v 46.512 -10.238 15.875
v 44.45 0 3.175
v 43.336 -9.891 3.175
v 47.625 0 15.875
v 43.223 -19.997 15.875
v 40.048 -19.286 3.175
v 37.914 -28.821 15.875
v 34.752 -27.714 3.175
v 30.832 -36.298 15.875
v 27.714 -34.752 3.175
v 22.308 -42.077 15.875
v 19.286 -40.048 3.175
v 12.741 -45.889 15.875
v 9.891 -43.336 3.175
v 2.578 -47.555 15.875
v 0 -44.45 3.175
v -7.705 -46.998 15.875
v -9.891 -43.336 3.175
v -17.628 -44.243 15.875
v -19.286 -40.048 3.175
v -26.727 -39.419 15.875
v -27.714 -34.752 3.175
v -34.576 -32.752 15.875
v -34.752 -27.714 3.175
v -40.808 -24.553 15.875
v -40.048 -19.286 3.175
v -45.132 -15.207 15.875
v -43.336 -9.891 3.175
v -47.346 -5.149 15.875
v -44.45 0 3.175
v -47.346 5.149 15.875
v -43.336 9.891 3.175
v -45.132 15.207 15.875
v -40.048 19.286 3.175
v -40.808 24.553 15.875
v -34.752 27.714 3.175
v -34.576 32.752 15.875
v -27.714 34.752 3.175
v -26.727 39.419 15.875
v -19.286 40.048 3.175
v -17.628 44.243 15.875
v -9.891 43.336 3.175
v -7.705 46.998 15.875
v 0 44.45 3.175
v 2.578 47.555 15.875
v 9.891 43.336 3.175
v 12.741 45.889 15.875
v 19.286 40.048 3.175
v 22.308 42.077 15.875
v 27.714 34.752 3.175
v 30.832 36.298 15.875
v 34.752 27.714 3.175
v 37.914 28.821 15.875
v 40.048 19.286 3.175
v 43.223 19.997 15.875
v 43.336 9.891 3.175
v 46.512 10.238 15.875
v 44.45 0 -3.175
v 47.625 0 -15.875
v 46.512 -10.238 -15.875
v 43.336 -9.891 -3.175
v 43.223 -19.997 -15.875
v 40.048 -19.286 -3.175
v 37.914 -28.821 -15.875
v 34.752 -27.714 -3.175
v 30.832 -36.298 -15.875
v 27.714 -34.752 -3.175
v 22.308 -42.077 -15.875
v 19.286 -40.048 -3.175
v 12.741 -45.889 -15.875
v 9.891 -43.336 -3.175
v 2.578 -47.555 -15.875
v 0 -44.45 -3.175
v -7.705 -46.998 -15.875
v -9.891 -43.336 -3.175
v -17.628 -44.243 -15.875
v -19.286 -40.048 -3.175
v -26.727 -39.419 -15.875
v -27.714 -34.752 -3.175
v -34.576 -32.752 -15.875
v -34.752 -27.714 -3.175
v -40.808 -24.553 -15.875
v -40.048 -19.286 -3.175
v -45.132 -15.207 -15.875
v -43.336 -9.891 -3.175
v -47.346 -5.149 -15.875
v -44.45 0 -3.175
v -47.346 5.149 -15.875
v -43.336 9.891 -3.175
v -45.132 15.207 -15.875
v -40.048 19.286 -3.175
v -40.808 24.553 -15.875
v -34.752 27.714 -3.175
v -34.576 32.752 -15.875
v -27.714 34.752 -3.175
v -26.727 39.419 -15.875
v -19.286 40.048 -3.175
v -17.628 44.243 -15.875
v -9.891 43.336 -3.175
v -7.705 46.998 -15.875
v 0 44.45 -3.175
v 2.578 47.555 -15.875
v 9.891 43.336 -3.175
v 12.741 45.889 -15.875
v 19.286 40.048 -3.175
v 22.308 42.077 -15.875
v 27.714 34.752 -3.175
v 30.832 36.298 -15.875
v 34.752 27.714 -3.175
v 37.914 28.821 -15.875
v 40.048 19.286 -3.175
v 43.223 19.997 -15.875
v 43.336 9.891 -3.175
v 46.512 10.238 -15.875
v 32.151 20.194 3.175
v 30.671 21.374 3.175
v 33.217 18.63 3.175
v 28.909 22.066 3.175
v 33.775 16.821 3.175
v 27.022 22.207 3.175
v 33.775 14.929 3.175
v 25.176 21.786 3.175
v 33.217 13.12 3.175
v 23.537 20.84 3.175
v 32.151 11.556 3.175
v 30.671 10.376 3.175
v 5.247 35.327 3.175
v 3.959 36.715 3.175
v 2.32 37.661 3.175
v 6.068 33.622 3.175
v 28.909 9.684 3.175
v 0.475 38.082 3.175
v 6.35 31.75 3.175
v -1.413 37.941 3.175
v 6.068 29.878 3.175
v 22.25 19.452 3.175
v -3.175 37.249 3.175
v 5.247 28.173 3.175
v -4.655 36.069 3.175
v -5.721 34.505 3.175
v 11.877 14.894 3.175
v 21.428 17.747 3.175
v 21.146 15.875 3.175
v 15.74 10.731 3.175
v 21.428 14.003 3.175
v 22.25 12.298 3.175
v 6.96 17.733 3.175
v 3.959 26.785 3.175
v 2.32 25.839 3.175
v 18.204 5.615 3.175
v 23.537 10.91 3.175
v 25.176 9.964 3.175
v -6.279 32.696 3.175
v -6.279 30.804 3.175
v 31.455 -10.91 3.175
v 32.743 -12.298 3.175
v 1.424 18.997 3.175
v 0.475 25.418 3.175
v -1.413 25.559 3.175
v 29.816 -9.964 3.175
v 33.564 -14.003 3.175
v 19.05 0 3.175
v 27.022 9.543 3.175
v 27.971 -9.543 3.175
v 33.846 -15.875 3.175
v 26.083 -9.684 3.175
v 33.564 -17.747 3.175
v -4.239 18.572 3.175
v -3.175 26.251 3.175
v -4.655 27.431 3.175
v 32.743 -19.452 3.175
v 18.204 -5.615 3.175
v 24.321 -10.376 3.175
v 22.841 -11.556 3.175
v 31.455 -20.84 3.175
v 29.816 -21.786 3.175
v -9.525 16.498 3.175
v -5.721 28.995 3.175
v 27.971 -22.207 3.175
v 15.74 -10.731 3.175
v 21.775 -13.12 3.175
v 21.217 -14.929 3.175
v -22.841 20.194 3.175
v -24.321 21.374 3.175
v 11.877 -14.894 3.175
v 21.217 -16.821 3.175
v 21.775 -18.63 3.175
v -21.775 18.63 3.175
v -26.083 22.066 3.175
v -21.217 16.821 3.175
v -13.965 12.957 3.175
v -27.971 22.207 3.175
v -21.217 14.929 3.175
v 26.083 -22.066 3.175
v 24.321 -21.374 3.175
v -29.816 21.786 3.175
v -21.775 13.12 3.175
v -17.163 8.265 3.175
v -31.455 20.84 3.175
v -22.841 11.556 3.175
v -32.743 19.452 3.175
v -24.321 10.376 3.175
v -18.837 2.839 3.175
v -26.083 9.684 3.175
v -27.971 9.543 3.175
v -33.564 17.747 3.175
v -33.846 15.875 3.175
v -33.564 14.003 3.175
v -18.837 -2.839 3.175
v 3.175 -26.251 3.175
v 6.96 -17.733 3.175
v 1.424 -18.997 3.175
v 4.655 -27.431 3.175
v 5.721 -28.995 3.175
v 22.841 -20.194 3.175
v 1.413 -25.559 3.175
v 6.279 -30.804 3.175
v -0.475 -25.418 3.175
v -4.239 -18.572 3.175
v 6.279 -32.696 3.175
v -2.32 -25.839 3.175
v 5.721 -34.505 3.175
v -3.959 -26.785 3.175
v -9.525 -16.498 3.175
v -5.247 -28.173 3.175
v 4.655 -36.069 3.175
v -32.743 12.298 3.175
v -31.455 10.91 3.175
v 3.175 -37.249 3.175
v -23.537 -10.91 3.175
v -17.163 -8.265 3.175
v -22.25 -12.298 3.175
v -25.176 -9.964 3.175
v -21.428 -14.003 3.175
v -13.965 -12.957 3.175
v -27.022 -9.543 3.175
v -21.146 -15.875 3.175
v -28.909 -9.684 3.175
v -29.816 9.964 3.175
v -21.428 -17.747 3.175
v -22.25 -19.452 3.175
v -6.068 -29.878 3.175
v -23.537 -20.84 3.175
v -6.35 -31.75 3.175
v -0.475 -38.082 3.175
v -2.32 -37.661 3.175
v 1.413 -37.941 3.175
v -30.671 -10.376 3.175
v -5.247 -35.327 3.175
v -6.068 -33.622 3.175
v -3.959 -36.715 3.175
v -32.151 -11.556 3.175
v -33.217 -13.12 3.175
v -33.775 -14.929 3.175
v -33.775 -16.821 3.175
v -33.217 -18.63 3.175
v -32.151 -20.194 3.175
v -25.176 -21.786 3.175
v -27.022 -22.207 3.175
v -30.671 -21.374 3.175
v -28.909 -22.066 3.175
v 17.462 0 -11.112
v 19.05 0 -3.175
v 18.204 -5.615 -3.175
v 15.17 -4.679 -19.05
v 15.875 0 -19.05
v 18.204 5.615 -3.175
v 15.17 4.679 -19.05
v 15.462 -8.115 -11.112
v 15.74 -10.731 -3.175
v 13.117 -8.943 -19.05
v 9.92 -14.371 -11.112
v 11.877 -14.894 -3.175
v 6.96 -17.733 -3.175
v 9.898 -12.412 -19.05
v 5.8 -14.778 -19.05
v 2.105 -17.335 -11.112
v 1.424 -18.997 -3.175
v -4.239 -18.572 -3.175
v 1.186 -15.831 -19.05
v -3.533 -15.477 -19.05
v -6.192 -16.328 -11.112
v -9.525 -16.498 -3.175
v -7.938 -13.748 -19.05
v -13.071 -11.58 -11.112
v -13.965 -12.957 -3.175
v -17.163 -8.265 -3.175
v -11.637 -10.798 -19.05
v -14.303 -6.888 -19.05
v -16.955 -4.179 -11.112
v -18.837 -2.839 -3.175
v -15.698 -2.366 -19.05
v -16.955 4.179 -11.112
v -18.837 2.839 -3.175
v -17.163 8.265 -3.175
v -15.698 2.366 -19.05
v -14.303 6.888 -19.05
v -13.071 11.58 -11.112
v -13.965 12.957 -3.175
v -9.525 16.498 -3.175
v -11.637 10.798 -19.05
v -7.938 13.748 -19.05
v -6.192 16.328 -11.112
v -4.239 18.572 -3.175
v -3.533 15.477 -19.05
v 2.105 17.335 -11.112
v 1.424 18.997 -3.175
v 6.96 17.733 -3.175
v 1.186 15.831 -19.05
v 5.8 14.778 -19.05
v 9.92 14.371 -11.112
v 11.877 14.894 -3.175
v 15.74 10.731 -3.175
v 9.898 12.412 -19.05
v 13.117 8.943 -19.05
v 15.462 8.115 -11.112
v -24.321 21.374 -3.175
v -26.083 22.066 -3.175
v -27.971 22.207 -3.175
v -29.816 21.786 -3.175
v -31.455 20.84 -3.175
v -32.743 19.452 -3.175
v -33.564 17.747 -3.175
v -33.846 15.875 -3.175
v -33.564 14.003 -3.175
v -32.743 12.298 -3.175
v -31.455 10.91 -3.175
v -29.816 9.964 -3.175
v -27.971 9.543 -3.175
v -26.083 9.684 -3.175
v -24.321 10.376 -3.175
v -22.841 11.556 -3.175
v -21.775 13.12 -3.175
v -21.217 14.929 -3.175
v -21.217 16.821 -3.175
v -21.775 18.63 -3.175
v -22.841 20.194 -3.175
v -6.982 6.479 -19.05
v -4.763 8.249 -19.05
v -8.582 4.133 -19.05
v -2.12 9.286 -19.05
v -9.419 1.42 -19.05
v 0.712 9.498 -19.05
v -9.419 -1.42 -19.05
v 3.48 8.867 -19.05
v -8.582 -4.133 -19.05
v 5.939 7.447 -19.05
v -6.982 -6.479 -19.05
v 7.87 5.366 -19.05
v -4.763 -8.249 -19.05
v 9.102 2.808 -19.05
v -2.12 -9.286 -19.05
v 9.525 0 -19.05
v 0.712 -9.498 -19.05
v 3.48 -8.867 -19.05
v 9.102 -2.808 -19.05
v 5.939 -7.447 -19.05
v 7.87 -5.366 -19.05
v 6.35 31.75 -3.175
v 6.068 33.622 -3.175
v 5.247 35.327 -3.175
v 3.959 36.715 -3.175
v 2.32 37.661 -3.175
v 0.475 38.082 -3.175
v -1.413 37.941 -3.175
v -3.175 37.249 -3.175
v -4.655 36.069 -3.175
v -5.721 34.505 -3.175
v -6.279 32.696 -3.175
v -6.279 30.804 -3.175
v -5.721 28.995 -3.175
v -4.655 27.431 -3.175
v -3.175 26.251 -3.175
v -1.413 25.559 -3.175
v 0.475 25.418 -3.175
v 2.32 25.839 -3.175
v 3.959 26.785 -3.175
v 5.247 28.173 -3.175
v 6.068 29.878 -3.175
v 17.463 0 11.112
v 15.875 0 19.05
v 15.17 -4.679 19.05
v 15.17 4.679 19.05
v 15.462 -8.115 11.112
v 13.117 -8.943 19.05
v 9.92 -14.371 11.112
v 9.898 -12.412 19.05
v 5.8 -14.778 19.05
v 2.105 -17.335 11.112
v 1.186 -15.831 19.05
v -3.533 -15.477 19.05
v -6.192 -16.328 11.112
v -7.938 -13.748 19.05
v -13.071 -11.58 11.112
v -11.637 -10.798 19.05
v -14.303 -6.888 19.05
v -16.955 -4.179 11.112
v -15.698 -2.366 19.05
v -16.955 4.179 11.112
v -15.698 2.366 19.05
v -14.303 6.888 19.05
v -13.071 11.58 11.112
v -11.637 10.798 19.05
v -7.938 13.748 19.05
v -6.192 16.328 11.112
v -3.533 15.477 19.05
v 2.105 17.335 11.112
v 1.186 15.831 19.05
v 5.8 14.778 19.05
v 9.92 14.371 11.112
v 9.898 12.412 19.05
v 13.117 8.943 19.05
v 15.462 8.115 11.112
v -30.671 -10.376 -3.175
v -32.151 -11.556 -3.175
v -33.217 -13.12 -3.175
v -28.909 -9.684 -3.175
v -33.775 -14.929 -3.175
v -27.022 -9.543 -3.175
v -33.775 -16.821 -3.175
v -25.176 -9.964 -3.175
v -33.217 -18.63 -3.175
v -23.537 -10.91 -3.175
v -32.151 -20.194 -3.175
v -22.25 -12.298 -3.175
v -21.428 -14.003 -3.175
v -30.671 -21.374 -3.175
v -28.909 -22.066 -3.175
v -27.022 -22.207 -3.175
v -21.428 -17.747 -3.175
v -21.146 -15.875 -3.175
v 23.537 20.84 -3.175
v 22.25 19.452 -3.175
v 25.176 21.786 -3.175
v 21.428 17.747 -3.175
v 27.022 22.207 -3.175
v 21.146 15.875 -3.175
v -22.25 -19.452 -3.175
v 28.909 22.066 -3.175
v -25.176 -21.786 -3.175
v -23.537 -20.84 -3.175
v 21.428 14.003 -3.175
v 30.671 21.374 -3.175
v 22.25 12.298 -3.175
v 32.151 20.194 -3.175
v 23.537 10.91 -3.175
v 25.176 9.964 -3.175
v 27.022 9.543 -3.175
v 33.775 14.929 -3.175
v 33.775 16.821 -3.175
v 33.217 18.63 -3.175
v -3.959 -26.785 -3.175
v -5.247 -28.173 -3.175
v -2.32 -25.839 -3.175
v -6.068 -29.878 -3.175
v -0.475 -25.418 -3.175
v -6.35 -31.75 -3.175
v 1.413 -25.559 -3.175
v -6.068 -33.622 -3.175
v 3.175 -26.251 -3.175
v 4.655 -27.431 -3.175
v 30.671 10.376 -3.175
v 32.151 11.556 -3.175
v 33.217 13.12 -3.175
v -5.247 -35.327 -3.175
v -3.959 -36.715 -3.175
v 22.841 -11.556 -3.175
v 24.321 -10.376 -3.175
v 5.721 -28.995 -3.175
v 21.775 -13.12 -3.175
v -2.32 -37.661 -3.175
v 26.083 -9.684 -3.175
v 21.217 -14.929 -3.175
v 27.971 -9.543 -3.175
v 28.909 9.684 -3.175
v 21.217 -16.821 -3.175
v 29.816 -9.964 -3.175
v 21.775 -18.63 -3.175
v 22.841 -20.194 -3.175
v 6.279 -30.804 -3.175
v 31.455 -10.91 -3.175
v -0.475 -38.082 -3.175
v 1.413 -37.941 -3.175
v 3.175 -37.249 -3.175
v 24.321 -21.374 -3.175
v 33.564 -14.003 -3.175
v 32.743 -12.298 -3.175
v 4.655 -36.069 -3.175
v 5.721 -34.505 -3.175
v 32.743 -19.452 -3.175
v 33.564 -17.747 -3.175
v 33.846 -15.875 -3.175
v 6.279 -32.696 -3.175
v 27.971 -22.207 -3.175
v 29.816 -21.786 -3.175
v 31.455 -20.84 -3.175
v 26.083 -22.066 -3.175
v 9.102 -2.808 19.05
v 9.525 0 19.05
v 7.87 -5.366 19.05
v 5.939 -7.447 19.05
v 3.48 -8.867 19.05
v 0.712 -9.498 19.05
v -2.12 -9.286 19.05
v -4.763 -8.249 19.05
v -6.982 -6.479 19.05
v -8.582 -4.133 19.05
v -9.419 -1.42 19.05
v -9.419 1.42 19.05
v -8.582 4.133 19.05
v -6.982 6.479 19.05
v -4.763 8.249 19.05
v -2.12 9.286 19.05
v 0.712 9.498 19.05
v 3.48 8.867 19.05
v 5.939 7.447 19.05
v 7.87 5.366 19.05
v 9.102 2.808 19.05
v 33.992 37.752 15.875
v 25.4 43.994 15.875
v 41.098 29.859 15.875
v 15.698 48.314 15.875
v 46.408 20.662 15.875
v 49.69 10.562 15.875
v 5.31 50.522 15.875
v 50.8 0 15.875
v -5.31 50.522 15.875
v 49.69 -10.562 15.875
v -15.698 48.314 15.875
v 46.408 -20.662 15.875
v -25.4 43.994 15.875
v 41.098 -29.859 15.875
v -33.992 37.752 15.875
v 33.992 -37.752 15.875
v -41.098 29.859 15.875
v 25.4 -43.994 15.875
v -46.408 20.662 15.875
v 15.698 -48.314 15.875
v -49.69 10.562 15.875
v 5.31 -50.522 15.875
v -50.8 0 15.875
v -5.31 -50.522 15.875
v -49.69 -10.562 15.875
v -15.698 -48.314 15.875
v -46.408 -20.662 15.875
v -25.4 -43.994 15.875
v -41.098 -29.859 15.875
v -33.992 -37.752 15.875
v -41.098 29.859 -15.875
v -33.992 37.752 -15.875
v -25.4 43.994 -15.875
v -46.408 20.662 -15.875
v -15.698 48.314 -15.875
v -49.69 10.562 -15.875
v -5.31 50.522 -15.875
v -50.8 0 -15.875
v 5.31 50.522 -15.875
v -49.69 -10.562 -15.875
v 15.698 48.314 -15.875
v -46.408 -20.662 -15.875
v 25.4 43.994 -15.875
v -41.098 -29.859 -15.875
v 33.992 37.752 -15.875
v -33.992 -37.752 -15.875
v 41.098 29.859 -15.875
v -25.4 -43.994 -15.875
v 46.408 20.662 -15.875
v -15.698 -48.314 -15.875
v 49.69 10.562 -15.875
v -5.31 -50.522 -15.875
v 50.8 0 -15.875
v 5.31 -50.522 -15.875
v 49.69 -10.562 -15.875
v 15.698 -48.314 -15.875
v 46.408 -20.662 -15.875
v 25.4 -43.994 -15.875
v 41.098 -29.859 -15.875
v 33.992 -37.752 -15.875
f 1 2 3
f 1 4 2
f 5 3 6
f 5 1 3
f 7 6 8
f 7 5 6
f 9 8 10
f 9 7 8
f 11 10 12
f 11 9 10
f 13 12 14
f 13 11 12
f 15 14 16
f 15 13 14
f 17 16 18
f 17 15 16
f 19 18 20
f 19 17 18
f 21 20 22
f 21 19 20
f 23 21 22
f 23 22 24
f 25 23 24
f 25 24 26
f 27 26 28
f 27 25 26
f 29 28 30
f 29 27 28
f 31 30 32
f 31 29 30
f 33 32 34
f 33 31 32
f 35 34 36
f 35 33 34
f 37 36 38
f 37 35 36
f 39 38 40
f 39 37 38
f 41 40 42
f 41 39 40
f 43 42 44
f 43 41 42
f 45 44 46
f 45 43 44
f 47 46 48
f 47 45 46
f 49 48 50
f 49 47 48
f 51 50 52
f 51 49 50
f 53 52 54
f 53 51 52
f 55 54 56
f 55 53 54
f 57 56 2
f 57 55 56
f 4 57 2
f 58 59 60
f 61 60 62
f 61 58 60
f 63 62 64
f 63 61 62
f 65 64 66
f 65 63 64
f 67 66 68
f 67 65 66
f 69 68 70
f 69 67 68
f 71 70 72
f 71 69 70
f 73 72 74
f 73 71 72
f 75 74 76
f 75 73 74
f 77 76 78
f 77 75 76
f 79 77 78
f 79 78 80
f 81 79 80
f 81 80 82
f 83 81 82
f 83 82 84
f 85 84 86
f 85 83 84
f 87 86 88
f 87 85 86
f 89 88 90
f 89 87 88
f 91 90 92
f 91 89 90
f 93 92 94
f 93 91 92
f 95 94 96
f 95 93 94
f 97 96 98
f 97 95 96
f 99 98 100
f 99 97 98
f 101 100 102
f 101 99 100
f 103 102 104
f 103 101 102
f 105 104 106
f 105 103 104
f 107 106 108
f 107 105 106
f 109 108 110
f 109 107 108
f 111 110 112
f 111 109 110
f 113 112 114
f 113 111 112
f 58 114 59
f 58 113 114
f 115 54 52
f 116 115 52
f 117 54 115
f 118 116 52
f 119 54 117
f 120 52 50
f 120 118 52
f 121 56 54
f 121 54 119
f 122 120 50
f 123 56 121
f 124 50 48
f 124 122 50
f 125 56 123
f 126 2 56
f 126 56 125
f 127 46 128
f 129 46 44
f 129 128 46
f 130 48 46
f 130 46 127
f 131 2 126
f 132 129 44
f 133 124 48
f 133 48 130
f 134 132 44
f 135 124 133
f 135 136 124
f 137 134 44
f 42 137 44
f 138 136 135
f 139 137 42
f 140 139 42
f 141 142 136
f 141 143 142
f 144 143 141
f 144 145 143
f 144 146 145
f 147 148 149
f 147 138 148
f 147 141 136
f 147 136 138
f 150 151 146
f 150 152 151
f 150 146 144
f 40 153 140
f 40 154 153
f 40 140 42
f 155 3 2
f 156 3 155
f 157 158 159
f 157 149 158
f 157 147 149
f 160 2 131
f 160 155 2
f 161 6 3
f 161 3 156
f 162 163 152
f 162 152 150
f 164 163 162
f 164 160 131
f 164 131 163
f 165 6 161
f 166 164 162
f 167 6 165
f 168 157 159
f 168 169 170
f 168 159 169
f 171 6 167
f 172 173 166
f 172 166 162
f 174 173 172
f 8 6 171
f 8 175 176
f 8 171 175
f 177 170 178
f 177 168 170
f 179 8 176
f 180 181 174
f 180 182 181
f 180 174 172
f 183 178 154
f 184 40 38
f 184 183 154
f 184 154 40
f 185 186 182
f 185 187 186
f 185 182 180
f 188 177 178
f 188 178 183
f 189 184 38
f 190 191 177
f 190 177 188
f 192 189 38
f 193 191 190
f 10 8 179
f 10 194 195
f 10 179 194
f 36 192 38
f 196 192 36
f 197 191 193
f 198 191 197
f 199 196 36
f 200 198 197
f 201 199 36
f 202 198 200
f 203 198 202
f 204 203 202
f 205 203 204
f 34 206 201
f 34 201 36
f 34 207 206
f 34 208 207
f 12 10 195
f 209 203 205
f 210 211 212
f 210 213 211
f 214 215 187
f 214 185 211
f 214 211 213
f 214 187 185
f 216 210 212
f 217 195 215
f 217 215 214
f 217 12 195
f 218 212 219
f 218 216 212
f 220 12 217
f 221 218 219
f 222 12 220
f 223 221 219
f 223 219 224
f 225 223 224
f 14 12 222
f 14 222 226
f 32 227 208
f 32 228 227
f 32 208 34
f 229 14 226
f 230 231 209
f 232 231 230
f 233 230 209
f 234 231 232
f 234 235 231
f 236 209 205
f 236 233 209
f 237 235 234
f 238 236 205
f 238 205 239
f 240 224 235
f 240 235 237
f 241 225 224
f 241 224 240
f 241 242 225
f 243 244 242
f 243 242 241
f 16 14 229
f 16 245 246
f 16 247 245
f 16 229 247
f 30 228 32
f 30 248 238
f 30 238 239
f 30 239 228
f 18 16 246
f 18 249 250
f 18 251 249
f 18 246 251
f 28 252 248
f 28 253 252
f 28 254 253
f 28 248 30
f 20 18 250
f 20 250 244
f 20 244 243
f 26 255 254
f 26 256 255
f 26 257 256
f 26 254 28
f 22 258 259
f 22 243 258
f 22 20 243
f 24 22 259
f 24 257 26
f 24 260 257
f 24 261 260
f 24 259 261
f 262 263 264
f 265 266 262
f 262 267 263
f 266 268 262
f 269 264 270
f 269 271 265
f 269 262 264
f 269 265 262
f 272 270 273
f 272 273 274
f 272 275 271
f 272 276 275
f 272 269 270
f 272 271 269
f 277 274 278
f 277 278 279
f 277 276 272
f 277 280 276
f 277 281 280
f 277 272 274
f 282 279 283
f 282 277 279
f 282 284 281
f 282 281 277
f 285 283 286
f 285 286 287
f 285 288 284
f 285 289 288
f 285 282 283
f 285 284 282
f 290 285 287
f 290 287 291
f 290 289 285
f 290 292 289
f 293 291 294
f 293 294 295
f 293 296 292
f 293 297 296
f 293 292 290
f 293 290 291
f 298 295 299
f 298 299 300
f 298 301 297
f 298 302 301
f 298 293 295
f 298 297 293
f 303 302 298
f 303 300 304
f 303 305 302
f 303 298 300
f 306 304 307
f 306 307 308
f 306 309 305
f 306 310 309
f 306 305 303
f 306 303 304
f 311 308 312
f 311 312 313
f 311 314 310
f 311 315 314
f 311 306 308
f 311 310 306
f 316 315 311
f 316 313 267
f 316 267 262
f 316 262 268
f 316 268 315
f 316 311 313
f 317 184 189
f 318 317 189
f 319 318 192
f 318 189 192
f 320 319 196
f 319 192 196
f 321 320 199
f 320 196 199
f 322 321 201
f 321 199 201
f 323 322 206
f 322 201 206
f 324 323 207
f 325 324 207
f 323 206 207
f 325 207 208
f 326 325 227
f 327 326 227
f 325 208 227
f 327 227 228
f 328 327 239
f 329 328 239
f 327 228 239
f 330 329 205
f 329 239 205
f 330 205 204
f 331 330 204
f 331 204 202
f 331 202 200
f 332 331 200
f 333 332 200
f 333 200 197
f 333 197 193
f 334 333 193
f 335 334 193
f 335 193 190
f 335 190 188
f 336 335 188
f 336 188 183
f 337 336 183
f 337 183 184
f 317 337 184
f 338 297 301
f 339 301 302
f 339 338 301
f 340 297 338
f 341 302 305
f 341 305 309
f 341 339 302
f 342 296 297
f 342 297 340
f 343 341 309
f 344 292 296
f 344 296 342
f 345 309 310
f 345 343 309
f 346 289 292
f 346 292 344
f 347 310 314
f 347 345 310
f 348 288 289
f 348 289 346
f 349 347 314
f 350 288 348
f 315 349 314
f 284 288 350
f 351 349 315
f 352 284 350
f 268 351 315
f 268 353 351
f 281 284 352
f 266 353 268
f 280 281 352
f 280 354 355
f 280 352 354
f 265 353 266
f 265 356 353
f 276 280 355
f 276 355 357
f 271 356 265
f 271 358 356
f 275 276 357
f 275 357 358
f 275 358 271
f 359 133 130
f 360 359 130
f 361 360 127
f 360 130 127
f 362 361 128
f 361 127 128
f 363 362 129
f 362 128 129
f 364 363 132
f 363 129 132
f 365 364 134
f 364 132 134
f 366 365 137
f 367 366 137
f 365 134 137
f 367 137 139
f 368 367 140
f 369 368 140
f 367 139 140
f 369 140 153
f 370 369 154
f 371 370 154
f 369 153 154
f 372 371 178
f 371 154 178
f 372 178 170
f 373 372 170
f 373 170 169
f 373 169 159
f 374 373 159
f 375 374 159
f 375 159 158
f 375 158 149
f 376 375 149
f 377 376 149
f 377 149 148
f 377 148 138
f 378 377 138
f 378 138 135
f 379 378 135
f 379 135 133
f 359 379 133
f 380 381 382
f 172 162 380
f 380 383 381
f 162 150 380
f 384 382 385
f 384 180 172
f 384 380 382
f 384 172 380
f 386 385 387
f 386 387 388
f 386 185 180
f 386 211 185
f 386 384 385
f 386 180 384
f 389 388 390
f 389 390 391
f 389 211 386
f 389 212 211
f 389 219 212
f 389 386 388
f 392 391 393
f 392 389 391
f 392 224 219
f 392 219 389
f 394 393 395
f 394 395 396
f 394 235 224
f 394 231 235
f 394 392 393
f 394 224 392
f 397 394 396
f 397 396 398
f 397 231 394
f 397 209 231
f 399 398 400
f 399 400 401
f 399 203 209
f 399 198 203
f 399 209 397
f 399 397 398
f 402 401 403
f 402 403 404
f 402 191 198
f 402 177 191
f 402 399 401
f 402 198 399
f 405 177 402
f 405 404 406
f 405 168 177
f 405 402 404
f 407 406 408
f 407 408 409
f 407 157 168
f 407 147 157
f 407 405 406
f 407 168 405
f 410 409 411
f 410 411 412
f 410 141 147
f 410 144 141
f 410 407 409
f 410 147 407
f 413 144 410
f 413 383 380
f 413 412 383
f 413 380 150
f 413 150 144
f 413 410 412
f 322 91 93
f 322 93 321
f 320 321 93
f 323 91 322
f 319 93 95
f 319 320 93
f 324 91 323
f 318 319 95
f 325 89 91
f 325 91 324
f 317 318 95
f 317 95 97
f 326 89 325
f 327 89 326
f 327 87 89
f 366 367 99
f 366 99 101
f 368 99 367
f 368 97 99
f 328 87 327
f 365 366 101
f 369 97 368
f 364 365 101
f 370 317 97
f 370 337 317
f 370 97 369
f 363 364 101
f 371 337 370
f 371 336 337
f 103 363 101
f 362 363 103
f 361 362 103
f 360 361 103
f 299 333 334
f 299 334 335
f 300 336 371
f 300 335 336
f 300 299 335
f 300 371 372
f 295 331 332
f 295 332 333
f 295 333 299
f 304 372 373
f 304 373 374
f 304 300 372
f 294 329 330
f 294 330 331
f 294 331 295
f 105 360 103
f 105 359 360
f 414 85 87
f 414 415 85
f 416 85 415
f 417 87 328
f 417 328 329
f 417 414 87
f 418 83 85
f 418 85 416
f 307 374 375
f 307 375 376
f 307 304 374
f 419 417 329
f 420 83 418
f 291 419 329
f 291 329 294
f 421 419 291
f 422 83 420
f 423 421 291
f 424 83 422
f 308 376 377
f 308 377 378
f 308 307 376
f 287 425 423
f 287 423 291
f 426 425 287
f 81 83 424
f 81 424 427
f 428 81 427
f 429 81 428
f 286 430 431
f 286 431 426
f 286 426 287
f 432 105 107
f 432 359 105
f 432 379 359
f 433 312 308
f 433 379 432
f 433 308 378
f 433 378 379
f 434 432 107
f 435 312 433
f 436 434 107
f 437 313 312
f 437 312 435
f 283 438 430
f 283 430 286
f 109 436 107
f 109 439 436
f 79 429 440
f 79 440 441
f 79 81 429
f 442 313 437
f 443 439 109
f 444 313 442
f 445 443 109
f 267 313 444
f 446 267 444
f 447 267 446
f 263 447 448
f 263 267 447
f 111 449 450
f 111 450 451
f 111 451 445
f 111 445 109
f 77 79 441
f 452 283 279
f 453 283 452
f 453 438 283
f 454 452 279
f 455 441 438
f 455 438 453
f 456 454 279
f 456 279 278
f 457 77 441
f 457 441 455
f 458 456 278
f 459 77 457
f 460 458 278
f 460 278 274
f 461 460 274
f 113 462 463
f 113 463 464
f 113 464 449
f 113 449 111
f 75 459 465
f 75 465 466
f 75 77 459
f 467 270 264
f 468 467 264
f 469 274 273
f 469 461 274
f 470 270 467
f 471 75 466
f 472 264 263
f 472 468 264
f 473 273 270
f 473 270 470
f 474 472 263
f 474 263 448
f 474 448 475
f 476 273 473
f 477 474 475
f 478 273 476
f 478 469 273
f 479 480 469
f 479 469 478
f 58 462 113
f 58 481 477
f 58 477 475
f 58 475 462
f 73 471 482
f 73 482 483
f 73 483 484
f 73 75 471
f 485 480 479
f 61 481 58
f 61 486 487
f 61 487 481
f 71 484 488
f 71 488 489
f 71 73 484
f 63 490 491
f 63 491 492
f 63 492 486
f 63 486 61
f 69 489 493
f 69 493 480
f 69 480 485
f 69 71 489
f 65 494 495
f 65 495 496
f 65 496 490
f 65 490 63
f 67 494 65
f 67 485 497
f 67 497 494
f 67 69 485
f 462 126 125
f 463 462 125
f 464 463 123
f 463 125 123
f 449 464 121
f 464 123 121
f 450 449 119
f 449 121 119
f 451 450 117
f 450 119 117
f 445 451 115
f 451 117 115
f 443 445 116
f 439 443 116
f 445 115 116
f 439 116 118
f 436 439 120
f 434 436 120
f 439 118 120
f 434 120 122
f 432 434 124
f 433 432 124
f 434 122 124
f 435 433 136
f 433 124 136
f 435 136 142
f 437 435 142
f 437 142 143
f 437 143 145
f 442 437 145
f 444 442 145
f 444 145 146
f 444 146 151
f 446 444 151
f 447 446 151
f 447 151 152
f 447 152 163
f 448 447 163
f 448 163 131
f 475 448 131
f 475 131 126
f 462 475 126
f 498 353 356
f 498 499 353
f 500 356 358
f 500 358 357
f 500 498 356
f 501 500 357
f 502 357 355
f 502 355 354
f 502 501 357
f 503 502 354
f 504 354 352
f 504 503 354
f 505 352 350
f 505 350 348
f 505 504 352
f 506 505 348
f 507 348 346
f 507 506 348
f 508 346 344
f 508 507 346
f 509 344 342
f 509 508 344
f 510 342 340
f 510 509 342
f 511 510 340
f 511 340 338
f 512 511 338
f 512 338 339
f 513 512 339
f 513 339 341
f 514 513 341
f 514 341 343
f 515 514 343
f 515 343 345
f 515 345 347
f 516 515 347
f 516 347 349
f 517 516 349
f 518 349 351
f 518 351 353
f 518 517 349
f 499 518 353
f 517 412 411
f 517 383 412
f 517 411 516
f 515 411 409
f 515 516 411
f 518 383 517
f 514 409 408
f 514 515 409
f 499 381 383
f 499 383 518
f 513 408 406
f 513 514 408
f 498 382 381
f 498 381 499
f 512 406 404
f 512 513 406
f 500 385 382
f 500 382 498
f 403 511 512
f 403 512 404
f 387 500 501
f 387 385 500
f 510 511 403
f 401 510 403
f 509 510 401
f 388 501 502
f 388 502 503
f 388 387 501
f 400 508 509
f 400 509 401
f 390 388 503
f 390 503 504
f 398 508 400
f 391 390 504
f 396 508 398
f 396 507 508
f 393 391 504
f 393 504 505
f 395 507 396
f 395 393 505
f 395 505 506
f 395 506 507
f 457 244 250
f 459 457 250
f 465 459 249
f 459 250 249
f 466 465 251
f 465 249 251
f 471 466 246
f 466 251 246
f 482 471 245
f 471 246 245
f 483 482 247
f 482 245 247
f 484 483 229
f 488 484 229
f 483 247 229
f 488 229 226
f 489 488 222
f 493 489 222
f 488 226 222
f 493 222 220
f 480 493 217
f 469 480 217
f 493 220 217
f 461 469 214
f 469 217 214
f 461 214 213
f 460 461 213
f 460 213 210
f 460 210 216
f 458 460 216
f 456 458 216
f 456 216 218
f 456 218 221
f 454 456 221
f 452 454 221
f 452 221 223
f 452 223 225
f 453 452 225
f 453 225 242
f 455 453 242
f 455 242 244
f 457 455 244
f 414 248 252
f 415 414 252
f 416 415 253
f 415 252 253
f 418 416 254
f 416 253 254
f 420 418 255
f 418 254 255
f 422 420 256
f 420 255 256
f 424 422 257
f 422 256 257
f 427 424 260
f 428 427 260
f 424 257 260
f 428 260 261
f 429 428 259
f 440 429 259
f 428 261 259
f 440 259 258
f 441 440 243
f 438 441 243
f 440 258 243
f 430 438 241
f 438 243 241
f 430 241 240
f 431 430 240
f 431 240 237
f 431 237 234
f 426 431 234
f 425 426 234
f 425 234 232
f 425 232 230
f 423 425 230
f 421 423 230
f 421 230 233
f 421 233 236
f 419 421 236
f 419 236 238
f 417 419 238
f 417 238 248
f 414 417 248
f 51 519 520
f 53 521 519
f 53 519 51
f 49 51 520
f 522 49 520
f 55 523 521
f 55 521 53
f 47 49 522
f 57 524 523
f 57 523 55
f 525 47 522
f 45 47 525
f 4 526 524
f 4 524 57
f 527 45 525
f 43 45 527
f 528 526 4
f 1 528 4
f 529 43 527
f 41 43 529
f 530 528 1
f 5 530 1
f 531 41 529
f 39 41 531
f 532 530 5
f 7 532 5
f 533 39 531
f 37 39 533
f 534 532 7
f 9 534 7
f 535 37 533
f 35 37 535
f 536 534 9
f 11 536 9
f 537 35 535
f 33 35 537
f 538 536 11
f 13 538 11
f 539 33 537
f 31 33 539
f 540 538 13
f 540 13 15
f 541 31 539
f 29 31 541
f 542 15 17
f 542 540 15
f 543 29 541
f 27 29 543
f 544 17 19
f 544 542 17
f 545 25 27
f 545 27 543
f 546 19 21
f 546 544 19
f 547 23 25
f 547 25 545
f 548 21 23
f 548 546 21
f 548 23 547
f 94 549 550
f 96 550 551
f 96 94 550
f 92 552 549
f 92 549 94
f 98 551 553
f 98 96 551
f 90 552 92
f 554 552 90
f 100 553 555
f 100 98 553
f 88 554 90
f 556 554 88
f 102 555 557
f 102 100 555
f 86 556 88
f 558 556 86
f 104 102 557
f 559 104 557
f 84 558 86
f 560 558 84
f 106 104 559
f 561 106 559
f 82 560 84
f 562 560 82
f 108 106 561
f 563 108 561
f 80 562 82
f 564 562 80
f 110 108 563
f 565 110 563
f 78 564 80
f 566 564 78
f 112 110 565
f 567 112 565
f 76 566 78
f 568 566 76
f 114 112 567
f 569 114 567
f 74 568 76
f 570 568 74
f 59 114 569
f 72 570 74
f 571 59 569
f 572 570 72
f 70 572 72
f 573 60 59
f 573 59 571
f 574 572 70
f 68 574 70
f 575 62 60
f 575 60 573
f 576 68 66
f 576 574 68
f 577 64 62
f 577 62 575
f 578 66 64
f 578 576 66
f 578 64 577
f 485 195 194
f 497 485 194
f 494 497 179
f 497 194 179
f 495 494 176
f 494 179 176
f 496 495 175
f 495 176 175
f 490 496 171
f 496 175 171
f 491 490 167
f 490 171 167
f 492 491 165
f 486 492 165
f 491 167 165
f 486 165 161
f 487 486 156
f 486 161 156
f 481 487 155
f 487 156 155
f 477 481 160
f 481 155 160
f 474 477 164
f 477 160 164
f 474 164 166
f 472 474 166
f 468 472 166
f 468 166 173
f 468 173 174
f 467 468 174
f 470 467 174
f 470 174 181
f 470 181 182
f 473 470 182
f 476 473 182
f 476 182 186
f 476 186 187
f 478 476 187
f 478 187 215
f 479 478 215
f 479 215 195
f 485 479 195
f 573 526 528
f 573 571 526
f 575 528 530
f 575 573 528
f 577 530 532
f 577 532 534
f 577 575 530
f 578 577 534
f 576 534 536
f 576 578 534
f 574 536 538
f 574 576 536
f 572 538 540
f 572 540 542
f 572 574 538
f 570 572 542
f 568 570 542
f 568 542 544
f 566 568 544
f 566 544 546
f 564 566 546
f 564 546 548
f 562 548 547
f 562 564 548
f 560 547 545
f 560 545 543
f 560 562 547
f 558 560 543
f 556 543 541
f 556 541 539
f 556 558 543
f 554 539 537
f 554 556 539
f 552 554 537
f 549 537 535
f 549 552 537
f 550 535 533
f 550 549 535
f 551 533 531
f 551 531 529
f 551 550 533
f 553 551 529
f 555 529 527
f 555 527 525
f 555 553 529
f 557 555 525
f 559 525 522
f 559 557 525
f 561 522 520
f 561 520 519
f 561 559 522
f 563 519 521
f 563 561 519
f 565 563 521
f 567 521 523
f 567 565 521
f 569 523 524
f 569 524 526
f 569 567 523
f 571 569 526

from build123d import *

# Parameters (mm, degrees)
SKETCH2_R          = 6.35
CUT_EXTRUDE1_DEPTH = 76.201267443
CIRPATTERN1_COUNT  = 6


with BuildPart() as part:
    # Sketch1 → Revolve1 (revolve)
    with BuildSketch(Plane(origin=(0, 0, 0), x_dir=(0, 0, -1), z_dir=(1, 0, 0)), mode=Mode.PRIVATE) as revolve1_sk:
        Polygon((19.05, 9.525), (-19.05, 9.525), (-19.05, 15.875), (-3.175, 19.05), (-3.175, 44.45), (-15.875, 47.625), (-15.875, 50.8), (15.875, 50.8), (15.875, 47.625), (3.175, 44.45), (3.175, 19.05), (19.05, 15.875), align=None)
    revolve(revolve1_sk.sketch.rotate(Axis((0, 0, 37.30886104), (0, 0, -1)), 90), axis=Axis((0, 0, 37.30886104), (0, 0, -1)))

    # Sketch2 → Cut-Extrude1 (cut, through all)
    with BuildSketch(Plane.XY.offset(3.175)):
        with Locations((0, 31.75)):
            Circle(SKETCH2_R)
    cut_extrude1 = extrude(amount=-CUT_EXTRUDE1_DEPTH, mode=Mode.SUBTRACT)

    # CirPattern1: Cut-Extrude1 ×6 about axis
    cirpattern1_axis = Axis((0, 0, 0), (0, 0, 1))
    for i in range(1, CIRPATTERN1_COUNT):
        add(cut_extrude1.rotate(cirpattern1_axis, i * 360 / CIRPATTERN1_COUNT), mode=Mode.SUBTRACT)


solid = part.part
